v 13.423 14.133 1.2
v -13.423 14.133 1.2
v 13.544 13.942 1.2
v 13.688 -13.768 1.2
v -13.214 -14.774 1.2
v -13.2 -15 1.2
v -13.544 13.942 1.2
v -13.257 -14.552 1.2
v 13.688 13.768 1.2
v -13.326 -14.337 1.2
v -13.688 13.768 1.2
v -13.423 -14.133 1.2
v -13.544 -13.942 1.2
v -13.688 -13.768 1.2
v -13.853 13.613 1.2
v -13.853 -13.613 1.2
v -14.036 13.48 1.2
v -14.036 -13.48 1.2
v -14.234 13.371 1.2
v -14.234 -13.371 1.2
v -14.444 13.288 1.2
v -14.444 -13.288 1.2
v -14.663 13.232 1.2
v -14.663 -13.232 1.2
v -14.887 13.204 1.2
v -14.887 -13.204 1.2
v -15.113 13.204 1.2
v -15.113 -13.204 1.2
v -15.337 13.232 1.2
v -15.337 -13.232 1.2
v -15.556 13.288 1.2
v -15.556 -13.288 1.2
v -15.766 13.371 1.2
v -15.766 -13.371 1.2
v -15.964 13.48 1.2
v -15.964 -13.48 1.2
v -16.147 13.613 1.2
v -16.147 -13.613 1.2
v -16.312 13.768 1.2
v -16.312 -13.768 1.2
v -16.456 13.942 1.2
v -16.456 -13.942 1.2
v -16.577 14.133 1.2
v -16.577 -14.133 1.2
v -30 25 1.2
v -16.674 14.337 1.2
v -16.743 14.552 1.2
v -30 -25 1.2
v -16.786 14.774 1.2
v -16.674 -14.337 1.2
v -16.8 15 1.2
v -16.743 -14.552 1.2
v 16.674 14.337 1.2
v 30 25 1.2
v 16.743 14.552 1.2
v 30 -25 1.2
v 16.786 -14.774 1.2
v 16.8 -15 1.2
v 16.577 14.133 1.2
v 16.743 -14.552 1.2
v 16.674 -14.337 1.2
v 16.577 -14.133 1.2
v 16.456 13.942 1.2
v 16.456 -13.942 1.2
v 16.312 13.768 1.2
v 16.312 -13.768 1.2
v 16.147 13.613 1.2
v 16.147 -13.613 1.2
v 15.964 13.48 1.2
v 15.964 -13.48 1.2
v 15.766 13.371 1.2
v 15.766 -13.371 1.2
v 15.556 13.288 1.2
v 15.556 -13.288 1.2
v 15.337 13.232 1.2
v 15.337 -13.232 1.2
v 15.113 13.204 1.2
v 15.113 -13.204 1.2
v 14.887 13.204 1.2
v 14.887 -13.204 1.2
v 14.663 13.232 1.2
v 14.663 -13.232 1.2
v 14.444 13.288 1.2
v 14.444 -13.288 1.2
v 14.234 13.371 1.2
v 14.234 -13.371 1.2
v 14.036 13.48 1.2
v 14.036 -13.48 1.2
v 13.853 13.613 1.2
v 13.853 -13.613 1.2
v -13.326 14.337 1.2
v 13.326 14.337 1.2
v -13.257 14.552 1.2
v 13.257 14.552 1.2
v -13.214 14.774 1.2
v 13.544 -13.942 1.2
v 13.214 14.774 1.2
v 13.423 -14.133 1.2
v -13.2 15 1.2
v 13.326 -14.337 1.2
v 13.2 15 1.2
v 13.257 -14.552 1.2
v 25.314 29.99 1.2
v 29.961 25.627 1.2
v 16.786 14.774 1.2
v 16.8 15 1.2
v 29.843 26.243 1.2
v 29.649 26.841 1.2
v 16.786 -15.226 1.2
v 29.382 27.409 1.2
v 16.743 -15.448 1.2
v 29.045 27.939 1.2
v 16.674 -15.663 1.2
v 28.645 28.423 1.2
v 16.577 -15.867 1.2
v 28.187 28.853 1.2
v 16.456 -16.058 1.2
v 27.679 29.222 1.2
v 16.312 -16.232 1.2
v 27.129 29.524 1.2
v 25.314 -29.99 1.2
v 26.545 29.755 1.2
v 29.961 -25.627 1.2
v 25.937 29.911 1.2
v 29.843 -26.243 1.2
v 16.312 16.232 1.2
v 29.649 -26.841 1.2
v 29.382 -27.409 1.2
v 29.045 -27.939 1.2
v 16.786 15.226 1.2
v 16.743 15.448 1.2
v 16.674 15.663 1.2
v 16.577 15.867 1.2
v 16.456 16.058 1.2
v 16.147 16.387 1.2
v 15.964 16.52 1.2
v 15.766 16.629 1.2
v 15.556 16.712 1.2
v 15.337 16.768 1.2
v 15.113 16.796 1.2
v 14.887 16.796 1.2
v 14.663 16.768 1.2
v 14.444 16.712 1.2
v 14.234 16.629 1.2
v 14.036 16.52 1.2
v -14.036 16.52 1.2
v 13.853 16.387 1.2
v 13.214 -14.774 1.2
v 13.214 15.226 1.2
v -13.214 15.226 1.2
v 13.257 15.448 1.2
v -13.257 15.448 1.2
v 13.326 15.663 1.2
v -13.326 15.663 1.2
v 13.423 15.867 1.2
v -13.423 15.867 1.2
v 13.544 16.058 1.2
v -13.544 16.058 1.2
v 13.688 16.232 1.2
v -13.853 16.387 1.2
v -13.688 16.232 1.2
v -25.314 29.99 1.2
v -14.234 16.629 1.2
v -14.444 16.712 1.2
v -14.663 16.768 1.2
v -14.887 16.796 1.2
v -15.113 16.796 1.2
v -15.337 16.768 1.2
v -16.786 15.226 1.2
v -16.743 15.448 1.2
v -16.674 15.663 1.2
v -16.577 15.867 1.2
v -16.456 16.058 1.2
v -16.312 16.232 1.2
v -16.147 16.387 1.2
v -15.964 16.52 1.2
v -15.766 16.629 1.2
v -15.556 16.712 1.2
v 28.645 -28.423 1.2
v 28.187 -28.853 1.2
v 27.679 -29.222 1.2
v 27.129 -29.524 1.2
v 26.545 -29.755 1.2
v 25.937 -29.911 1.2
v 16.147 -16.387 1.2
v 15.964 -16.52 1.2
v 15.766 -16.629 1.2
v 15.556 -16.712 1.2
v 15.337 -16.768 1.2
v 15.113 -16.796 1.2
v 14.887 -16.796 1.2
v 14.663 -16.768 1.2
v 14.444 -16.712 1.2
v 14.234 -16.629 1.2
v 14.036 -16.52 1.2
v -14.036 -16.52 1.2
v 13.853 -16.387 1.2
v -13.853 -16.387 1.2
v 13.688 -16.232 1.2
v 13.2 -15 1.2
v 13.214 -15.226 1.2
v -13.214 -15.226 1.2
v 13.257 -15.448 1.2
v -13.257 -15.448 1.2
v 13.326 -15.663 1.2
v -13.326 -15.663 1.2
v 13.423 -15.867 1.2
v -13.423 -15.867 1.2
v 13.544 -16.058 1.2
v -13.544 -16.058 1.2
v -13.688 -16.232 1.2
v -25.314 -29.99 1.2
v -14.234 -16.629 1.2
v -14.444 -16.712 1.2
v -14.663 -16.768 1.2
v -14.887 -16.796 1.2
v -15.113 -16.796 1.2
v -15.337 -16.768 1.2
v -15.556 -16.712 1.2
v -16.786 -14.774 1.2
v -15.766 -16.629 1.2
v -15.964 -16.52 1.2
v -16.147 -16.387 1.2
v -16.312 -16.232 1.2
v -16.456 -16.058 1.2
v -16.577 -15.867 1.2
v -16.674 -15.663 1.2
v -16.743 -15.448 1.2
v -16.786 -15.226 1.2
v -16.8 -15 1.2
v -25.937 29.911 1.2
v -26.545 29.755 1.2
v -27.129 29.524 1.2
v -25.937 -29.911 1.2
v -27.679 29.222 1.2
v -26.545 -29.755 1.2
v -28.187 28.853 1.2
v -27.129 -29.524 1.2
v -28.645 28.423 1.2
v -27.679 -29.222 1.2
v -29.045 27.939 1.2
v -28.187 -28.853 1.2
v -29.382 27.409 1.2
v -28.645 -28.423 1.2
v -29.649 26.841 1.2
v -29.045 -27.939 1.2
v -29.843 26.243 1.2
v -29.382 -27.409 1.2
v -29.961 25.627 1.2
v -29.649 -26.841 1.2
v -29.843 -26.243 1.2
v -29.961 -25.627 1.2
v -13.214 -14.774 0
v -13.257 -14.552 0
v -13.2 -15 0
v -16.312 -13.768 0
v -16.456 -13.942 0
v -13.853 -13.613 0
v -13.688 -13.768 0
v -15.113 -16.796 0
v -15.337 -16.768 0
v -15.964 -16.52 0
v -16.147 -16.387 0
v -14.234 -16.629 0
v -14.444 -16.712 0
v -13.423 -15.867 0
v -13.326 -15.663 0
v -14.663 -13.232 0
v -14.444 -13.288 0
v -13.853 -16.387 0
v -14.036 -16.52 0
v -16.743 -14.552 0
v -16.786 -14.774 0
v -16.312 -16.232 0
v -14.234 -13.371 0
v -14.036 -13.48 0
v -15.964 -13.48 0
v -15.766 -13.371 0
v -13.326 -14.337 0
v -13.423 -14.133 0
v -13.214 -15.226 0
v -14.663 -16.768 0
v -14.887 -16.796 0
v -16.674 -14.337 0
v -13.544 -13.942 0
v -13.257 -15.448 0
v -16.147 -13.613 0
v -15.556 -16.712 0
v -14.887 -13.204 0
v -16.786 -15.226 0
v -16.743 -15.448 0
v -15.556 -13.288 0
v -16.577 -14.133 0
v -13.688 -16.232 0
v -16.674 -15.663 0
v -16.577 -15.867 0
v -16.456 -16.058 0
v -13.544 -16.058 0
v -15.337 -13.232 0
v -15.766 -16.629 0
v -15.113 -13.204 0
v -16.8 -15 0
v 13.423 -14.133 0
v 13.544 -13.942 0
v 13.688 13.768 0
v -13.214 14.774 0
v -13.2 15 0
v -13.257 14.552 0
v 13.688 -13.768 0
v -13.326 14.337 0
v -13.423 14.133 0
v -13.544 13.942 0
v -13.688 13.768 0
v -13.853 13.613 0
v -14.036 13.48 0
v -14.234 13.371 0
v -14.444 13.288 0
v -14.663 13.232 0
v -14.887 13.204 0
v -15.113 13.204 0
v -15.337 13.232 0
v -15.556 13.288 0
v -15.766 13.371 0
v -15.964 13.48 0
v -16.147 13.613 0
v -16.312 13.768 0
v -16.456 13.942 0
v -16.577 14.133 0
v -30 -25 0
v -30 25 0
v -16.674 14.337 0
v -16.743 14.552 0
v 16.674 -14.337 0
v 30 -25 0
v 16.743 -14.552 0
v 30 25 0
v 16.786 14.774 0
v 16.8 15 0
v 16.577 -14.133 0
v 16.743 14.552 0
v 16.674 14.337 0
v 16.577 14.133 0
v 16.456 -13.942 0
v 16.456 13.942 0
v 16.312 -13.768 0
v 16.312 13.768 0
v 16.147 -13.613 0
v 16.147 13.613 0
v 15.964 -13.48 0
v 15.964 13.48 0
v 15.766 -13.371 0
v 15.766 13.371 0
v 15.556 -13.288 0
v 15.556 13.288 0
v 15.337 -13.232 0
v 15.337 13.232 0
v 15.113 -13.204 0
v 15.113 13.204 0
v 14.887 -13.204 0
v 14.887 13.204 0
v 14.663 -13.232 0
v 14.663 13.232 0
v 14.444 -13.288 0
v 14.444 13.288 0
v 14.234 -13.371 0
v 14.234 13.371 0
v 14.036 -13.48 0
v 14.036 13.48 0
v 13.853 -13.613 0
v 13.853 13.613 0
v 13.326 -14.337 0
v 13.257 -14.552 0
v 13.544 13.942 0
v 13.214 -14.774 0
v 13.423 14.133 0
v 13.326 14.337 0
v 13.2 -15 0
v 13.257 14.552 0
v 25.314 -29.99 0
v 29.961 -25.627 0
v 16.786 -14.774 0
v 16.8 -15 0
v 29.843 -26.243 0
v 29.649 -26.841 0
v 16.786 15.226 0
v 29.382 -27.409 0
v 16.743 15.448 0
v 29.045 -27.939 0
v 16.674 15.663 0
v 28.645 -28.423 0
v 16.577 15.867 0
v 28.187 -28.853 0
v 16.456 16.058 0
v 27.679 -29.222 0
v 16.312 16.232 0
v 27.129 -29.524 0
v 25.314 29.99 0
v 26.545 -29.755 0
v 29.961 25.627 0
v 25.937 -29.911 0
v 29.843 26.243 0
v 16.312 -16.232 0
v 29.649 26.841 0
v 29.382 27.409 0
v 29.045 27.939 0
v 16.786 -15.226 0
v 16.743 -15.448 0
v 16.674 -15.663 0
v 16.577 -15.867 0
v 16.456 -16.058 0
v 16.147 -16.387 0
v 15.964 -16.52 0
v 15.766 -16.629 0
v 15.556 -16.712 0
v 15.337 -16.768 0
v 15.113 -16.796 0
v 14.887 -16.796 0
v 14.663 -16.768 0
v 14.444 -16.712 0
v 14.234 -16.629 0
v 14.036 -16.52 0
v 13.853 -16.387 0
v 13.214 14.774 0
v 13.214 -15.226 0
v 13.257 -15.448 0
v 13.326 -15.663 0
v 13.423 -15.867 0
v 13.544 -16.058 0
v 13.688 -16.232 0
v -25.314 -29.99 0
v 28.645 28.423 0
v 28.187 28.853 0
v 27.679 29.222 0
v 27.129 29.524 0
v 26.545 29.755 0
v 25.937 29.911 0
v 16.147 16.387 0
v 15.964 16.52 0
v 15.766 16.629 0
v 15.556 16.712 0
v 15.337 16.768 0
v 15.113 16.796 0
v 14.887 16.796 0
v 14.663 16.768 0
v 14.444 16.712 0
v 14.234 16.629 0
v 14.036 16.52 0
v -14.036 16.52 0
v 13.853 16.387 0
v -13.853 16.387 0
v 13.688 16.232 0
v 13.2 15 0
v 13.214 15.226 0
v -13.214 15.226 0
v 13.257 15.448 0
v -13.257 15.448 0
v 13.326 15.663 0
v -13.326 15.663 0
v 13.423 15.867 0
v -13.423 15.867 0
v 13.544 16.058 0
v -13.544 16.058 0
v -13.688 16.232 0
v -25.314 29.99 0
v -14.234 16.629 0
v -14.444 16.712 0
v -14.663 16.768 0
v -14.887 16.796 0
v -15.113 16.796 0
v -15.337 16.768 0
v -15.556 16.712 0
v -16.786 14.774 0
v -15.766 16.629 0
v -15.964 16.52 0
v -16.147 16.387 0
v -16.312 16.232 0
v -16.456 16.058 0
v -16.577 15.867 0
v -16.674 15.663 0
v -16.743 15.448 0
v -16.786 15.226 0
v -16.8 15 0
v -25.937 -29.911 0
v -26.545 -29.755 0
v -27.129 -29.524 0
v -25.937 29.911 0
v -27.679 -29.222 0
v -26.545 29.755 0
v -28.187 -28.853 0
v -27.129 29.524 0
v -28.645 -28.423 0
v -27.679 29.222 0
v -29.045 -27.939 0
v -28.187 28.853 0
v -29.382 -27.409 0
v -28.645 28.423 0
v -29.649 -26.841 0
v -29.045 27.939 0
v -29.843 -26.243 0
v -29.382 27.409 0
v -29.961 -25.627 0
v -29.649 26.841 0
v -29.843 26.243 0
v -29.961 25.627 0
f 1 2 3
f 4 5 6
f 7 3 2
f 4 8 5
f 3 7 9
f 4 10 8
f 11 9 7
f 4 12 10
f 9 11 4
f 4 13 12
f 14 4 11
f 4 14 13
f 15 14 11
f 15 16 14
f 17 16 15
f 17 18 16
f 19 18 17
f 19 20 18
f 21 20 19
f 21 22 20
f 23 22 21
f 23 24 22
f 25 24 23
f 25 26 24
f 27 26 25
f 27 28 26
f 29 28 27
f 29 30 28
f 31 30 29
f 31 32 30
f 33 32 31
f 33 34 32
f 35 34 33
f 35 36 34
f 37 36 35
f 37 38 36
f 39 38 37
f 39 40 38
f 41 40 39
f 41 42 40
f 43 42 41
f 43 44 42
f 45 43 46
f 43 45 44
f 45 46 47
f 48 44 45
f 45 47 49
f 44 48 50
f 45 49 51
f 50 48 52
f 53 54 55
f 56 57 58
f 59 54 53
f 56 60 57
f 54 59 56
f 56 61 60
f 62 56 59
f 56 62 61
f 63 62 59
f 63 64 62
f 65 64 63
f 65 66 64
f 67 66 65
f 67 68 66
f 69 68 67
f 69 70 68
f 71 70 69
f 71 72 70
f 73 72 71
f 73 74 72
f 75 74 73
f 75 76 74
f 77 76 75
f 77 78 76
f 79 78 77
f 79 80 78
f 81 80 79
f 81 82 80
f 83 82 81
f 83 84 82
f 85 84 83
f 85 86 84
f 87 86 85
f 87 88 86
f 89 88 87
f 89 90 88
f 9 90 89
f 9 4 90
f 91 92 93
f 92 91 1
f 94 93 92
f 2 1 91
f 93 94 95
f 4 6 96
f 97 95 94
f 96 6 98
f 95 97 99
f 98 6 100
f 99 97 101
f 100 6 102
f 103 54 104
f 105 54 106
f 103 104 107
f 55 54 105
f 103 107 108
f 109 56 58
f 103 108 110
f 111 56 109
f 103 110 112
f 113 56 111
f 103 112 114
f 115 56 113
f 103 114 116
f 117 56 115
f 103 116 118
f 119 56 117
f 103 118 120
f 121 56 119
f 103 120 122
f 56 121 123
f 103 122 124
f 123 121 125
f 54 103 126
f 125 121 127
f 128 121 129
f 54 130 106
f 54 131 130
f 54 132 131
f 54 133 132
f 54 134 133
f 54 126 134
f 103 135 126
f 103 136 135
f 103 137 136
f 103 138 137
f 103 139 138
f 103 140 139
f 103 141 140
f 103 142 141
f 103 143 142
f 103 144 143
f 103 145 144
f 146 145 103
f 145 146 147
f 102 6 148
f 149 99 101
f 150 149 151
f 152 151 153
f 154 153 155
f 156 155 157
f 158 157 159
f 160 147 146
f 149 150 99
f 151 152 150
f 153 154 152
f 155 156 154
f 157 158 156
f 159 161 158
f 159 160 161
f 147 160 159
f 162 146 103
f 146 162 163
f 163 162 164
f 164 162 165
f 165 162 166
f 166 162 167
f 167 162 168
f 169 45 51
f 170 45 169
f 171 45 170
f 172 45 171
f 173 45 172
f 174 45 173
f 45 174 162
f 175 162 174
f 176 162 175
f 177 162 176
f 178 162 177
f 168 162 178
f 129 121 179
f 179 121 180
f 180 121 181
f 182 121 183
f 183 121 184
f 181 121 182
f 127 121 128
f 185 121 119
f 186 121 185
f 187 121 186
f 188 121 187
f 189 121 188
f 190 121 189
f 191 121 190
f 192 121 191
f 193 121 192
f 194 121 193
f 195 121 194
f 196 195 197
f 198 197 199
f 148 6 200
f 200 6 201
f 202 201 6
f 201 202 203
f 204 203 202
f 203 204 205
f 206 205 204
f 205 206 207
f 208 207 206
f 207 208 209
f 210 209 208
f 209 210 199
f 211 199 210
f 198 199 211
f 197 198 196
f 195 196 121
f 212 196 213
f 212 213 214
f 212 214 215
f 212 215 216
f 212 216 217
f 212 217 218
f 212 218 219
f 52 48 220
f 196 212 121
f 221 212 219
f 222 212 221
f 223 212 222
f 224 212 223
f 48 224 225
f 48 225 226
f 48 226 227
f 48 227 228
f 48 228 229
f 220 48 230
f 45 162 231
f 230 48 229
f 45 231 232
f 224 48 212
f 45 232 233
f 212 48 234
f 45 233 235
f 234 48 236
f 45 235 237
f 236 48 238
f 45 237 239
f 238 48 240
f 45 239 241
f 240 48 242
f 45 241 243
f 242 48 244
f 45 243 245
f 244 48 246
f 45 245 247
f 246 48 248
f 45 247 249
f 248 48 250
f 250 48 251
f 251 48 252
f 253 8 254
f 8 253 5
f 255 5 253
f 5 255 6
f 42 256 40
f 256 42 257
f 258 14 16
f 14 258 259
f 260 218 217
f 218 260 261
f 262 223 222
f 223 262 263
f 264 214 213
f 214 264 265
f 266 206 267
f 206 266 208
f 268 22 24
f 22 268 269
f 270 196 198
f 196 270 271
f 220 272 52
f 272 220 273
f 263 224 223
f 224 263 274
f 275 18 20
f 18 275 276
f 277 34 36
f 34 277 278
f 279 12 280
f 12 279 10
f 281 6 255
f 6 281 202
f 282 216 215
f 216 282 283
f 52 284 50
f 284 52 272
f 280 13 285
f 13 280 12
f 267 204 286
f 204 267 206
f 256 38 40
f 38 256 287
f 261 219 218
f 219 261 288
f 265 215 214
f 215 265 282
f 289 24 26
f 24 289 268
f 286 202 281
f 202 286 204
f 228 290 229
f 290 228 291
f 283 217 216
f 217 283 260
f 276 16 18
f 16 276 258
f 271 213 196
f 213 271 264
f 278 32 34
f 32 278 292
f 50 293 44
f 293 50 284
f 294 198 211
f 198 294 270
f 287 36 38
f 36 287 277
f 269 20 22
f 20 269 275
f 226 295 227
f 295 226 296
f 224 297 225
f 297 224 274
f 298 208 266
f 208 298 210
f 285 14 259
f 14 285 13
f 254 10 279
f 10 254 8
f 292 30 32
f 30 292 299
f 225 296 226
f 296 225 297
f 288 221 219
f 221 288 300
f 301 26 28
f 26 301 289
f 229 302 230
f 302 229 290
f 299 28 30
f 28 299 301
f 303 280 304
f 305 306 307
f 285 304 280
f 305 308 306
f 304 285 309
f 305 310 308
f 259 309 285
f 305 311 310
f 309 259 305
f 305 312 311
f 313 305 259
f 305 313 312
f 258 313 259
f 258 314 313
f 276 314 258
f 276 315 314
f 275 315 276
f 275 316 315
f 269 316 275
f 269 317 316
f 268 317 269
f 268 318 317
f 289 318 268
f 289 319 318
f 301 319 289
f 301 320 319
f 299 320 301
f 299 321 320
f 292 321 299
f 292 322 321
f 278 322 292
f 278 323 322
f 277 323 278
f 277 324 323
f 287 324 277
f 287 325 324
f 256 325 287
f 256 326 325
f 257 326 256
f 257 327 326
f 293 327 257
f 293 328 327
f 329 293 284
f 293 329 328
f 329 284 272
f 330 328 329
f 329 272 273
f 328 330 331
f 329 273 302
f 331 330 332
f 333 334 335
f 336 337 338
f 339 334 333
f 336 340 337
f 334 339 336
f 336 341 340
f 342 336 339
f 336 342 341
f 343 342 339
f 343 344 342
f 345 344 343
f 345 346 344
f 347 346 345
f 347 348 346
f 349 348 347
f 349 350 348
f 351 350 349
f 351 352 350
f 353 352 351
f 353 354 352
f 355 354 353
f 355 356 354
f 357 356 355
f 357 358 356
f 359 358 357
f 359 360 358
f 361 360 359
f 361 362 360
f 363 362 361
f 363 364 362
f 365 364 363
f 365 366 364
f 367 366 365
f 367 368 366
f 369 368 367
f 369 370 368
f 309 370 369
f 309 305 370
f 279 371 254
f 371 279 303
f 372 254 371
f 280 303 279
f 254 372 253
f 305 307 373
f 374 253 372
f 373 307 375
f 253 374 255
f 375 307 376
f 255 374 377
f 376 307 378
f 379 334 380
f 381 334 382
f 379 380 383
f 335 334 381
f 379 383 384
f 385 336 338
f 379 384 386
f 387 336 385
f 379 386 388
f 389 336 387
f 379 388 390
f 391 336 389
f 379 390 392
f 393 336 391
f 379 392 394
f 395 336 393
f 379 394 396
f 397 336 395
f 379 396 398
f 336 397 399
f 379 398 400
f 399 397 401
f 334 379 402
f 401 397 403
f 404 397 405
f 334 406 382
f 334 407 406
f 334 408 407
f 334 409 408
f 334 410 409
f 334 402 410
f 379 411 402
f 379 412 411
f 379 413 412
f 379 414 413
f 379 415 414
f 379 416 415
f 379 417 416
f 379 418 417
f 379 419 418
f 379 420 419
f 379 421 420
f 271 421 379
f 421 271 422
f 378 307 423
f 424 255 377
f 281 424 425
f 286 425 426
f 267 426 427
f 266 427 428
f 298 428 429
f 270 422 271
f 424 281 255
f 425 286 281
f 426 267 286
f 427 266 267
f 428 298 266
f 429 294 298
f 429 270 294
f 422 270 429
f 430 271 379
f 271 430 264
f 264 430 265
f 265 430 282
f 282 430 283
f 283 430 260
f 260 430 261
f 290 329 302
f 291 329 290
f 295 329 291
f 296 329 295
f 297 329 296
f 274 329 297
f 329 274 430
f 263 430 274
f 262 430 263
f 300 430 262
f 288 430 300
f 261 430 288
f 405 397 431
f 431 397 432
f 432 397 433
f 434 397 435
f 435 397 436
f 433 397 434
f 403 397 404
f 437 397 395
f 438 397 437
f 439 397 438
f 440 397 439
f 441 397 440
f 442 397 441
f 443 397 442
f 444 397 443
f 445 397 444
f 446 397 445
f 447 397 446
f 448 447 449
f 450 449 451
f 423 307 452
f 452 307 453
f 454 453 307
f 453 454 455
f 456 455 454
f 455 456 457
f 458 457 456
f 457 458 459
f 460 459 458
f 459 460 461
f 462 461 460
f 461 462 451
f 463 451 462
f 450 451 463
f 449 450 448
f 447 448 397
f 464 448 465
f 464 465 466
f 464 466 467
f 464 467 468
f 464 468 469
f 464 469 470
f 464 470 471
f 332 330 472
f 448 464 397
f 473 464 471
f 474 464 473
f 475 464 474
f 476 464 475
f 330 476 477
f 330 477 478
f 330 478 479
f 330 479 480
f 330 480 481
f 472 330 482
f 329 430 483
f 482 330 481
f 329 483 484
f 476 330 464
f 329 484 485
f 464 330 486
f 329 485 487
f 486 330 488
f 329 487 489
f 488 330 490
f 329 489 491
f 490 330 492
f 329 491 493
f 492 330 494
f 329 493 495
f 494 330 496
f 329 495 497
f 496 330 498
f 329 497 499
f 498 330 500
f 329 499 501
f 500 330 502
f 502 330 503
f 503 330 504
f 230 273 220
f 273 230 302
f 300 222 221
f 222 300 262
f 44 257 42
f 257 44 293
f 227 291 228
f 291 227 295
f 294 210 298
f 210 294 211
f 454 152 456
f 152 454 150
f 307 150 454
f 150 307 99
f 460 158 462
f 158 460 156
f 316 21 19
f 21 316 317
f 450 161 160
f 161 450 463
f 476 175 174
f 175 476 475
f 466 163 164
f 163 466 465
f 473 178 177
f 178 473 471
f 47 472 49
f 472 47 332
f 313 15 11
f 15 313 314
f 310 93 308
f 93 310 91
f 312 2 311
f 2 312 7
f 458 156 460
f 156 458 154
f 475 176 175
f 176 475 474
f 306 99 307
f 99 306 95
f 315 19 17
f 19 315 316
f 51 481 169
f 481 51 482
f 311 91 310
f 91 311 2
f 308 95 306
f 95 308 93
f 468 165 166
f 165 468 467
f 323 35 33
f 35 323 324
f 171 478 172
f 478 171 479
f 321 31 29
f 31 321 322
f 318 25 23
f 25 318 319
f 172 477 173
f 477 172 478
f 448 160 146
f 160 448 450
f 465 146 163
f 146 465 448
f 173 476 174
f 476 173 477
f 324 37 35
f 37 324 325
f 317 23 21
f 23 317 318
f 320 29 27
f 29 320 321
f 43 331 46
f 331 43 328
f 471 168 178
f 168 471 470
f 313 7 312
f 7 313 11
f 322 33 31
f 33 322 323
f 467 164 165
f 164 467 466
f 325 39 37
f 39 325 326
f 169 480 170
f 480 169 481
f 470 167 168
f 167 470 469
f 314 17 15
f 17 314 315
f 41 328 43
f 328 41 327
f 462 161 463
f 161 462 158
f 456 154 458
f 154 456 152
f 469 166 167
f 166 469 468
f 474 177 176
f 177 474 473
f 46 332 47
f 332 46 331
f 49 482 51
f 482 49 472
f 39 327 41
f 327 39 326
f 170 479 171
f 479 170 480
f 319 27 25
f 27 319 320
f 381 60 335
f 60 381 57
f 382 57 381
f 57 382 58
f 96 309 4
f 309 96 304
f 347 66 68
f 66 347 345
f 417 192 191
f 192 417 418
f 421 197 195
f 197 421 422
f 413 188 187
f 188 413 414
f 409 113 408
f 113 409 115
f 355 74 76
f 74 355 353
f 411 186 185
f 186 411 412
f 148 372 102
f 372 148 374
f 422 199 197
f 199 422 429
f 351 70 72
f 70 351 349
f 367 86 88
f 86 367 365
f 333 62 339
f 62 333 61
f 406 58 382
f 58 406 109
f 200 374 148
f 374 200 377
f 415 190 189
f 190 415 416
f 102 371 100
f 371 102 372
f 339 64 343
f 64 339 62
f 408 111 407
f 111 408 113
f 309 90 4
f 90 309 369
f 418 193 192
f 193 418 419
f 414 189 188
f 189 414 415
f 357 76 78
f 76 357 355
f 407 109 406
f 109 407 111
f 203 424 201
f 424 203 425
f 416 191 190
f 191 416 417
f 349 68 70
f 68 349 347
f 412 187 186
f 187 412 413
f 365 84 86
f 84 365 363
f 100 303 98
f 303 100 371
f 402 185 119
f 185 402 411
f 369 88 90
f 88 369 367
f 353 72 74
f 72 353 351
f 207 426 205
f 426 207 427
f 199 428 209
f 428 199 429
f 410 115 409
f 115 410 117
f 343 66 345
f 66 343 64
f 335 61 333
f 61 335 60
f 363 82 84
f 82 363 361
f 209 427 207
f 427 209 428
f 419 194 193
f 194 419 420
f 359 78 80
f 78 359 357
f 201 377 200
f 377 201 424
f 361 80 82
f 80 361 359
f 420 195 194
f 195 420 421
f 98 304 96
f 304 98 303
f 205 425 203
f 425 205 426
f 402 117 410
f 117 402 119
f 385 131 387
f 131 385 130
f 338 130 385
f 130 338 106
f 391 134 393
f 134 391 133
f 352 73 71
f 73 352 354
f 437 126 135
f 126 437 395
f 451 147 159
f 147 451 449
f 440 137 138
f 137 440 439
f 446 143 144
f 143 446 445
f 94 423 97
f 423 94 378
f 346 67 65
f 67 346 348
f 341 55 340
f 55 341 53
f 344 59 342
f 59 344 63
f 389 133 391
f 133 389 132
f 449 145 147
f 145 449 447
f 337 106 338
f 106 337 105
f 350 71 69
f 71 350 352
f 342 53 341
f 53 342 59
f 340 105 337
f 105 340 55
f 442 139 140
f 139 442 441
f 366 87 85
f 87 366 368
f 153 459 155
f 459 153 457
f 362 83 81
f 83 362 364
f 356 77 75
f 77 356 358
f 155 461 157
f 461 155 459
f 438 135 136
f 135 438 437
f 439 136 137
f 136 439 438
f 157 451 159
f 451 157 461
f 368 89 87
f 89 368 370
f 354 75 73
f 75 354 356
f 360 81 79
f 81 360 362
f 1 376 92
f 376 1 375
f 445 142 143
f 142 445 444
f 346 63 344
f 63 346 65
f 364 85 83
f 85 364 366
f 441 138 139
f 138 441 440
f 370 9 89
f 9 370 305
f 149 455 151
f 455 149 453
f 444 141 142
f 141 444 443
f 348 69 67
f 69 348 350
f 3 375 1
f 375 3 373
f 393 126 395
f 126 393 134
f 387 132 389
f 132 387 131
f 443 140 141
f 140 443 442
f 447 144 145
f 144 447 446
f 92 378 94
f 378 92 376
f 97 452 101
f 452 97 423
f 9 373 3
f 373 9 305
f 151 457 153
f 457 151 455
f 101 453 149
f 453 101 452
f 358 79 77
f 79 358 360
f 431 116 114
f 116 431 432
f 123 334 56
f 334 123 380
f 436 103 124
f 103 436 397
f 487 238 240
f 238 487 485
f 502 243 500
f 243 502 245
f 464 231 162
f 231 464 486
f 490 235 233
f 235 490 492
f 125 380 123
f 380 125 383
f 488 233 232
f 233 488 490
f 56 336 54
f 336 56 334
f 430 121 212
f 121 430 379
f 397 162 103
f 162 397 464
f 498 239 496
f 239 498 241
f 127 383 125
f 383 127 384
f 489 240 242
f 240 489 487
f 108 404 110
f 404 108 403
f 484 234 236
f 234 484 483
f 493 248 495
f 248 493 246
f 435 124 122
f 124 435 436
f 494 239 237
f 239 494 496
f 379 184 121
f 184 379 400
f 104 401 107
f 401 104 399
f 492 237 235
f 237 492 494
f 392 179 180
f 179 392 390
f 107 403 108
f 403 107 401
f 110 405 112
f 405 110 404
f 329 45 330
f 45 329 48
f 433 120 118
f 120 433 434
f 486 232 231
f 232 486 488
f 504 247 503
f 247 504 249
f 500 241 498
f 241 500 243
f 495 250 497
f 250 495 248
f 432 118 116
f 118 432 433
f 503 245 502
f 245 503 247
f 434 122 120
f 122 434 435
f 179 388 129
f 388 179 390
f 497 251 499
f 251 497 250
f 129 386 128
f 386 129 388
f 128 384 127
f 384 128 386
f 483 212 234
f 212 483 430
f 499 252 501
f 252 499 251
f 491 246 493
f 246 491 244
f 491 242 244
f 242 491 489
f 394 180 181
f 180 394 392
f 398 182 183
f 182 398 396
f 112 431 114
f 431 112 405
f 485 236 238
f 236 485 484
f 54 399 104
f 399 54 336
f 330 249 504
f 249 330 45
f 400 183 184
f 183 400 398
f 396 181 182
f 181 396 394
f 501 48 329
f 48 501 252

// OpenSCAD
$fn = 50;


difference() {
	union() {
		hull() {
			translate(v = [-25.0000000000, 25.0000000000, 0]) {
				cylinder(h = 27, r = 5);
			}
			translate(v = [25.0000000000, 25.0000000000, 0]) {
				cylinder(h = 27, r = 5);
			}
			translate(v = [-25.0000000000, -25.0000000000, 0]) {
				cylinder(h = 27, r = 5);
			}
			translate(v = [25.0000000000, -25.0000000000, 0]) {
				cylinder(h = 27, r = 5);
			}
		}
	}
	union() {
		translate(v = [0, 0, 1.2000000000]) {
			hull() {
				translate(v = [-25.0000000000, 25.0000000000, 0]) {
					cylinder(h = 25.8000000000, r = 3.8000000000);
				}
				translate(v = [25.0000000000, 25.0000000000, 0]) {
					cylinder(h = 25.8000000000, r = 3.8000000000);
				}
				translate(v = [-25.0000000000, -25.0000000000, 0]) {
					cylinder(h = 25.8000000000, r = 3.8000000000);
				}
				translate(v = [25.0000000000, -25.0000000000, 0]) {
					cylinder(h = 25.8000000000, r = 3.8000000000);
				}
			}
		}
		#translate(v = [-15.0000000000, -15.0000000000, 0]) {
			cylinder(h = 1.2000000000, r = 1.8000000000);
		}
		#translate(v = [-15.0000000000, 15.0000000000, 0]) {
			cylinder(h = 1.2000000000, r = 1.8000000000);
		}
		#translate(v = [15.0000000000, -15.0000000000, 0]) {
			cylinder(h = 1.2000000000, r = 1.8000000000);
		}
		#translate(v = [15.0000000000, 15.0000000000, 0]) {
			cylinder(h = 1.2000000000, r = 1.8000000000);
		}
		translate(v = [-250.0000000000, -250.0000000000, 1.2000000000]) {
			cube(size = [500, 500, 500]);
		}
		translate(v = [-250.0000000000, -250.0000000000, 1.2000000000]) {
			cube(size = [500, 500, 500]);
		}
		translate(v = [-250.0000000000, -250.0000000000, 1.2000000000]) {
			cube(size = [500, 500, 500]);
		}
	}
}
